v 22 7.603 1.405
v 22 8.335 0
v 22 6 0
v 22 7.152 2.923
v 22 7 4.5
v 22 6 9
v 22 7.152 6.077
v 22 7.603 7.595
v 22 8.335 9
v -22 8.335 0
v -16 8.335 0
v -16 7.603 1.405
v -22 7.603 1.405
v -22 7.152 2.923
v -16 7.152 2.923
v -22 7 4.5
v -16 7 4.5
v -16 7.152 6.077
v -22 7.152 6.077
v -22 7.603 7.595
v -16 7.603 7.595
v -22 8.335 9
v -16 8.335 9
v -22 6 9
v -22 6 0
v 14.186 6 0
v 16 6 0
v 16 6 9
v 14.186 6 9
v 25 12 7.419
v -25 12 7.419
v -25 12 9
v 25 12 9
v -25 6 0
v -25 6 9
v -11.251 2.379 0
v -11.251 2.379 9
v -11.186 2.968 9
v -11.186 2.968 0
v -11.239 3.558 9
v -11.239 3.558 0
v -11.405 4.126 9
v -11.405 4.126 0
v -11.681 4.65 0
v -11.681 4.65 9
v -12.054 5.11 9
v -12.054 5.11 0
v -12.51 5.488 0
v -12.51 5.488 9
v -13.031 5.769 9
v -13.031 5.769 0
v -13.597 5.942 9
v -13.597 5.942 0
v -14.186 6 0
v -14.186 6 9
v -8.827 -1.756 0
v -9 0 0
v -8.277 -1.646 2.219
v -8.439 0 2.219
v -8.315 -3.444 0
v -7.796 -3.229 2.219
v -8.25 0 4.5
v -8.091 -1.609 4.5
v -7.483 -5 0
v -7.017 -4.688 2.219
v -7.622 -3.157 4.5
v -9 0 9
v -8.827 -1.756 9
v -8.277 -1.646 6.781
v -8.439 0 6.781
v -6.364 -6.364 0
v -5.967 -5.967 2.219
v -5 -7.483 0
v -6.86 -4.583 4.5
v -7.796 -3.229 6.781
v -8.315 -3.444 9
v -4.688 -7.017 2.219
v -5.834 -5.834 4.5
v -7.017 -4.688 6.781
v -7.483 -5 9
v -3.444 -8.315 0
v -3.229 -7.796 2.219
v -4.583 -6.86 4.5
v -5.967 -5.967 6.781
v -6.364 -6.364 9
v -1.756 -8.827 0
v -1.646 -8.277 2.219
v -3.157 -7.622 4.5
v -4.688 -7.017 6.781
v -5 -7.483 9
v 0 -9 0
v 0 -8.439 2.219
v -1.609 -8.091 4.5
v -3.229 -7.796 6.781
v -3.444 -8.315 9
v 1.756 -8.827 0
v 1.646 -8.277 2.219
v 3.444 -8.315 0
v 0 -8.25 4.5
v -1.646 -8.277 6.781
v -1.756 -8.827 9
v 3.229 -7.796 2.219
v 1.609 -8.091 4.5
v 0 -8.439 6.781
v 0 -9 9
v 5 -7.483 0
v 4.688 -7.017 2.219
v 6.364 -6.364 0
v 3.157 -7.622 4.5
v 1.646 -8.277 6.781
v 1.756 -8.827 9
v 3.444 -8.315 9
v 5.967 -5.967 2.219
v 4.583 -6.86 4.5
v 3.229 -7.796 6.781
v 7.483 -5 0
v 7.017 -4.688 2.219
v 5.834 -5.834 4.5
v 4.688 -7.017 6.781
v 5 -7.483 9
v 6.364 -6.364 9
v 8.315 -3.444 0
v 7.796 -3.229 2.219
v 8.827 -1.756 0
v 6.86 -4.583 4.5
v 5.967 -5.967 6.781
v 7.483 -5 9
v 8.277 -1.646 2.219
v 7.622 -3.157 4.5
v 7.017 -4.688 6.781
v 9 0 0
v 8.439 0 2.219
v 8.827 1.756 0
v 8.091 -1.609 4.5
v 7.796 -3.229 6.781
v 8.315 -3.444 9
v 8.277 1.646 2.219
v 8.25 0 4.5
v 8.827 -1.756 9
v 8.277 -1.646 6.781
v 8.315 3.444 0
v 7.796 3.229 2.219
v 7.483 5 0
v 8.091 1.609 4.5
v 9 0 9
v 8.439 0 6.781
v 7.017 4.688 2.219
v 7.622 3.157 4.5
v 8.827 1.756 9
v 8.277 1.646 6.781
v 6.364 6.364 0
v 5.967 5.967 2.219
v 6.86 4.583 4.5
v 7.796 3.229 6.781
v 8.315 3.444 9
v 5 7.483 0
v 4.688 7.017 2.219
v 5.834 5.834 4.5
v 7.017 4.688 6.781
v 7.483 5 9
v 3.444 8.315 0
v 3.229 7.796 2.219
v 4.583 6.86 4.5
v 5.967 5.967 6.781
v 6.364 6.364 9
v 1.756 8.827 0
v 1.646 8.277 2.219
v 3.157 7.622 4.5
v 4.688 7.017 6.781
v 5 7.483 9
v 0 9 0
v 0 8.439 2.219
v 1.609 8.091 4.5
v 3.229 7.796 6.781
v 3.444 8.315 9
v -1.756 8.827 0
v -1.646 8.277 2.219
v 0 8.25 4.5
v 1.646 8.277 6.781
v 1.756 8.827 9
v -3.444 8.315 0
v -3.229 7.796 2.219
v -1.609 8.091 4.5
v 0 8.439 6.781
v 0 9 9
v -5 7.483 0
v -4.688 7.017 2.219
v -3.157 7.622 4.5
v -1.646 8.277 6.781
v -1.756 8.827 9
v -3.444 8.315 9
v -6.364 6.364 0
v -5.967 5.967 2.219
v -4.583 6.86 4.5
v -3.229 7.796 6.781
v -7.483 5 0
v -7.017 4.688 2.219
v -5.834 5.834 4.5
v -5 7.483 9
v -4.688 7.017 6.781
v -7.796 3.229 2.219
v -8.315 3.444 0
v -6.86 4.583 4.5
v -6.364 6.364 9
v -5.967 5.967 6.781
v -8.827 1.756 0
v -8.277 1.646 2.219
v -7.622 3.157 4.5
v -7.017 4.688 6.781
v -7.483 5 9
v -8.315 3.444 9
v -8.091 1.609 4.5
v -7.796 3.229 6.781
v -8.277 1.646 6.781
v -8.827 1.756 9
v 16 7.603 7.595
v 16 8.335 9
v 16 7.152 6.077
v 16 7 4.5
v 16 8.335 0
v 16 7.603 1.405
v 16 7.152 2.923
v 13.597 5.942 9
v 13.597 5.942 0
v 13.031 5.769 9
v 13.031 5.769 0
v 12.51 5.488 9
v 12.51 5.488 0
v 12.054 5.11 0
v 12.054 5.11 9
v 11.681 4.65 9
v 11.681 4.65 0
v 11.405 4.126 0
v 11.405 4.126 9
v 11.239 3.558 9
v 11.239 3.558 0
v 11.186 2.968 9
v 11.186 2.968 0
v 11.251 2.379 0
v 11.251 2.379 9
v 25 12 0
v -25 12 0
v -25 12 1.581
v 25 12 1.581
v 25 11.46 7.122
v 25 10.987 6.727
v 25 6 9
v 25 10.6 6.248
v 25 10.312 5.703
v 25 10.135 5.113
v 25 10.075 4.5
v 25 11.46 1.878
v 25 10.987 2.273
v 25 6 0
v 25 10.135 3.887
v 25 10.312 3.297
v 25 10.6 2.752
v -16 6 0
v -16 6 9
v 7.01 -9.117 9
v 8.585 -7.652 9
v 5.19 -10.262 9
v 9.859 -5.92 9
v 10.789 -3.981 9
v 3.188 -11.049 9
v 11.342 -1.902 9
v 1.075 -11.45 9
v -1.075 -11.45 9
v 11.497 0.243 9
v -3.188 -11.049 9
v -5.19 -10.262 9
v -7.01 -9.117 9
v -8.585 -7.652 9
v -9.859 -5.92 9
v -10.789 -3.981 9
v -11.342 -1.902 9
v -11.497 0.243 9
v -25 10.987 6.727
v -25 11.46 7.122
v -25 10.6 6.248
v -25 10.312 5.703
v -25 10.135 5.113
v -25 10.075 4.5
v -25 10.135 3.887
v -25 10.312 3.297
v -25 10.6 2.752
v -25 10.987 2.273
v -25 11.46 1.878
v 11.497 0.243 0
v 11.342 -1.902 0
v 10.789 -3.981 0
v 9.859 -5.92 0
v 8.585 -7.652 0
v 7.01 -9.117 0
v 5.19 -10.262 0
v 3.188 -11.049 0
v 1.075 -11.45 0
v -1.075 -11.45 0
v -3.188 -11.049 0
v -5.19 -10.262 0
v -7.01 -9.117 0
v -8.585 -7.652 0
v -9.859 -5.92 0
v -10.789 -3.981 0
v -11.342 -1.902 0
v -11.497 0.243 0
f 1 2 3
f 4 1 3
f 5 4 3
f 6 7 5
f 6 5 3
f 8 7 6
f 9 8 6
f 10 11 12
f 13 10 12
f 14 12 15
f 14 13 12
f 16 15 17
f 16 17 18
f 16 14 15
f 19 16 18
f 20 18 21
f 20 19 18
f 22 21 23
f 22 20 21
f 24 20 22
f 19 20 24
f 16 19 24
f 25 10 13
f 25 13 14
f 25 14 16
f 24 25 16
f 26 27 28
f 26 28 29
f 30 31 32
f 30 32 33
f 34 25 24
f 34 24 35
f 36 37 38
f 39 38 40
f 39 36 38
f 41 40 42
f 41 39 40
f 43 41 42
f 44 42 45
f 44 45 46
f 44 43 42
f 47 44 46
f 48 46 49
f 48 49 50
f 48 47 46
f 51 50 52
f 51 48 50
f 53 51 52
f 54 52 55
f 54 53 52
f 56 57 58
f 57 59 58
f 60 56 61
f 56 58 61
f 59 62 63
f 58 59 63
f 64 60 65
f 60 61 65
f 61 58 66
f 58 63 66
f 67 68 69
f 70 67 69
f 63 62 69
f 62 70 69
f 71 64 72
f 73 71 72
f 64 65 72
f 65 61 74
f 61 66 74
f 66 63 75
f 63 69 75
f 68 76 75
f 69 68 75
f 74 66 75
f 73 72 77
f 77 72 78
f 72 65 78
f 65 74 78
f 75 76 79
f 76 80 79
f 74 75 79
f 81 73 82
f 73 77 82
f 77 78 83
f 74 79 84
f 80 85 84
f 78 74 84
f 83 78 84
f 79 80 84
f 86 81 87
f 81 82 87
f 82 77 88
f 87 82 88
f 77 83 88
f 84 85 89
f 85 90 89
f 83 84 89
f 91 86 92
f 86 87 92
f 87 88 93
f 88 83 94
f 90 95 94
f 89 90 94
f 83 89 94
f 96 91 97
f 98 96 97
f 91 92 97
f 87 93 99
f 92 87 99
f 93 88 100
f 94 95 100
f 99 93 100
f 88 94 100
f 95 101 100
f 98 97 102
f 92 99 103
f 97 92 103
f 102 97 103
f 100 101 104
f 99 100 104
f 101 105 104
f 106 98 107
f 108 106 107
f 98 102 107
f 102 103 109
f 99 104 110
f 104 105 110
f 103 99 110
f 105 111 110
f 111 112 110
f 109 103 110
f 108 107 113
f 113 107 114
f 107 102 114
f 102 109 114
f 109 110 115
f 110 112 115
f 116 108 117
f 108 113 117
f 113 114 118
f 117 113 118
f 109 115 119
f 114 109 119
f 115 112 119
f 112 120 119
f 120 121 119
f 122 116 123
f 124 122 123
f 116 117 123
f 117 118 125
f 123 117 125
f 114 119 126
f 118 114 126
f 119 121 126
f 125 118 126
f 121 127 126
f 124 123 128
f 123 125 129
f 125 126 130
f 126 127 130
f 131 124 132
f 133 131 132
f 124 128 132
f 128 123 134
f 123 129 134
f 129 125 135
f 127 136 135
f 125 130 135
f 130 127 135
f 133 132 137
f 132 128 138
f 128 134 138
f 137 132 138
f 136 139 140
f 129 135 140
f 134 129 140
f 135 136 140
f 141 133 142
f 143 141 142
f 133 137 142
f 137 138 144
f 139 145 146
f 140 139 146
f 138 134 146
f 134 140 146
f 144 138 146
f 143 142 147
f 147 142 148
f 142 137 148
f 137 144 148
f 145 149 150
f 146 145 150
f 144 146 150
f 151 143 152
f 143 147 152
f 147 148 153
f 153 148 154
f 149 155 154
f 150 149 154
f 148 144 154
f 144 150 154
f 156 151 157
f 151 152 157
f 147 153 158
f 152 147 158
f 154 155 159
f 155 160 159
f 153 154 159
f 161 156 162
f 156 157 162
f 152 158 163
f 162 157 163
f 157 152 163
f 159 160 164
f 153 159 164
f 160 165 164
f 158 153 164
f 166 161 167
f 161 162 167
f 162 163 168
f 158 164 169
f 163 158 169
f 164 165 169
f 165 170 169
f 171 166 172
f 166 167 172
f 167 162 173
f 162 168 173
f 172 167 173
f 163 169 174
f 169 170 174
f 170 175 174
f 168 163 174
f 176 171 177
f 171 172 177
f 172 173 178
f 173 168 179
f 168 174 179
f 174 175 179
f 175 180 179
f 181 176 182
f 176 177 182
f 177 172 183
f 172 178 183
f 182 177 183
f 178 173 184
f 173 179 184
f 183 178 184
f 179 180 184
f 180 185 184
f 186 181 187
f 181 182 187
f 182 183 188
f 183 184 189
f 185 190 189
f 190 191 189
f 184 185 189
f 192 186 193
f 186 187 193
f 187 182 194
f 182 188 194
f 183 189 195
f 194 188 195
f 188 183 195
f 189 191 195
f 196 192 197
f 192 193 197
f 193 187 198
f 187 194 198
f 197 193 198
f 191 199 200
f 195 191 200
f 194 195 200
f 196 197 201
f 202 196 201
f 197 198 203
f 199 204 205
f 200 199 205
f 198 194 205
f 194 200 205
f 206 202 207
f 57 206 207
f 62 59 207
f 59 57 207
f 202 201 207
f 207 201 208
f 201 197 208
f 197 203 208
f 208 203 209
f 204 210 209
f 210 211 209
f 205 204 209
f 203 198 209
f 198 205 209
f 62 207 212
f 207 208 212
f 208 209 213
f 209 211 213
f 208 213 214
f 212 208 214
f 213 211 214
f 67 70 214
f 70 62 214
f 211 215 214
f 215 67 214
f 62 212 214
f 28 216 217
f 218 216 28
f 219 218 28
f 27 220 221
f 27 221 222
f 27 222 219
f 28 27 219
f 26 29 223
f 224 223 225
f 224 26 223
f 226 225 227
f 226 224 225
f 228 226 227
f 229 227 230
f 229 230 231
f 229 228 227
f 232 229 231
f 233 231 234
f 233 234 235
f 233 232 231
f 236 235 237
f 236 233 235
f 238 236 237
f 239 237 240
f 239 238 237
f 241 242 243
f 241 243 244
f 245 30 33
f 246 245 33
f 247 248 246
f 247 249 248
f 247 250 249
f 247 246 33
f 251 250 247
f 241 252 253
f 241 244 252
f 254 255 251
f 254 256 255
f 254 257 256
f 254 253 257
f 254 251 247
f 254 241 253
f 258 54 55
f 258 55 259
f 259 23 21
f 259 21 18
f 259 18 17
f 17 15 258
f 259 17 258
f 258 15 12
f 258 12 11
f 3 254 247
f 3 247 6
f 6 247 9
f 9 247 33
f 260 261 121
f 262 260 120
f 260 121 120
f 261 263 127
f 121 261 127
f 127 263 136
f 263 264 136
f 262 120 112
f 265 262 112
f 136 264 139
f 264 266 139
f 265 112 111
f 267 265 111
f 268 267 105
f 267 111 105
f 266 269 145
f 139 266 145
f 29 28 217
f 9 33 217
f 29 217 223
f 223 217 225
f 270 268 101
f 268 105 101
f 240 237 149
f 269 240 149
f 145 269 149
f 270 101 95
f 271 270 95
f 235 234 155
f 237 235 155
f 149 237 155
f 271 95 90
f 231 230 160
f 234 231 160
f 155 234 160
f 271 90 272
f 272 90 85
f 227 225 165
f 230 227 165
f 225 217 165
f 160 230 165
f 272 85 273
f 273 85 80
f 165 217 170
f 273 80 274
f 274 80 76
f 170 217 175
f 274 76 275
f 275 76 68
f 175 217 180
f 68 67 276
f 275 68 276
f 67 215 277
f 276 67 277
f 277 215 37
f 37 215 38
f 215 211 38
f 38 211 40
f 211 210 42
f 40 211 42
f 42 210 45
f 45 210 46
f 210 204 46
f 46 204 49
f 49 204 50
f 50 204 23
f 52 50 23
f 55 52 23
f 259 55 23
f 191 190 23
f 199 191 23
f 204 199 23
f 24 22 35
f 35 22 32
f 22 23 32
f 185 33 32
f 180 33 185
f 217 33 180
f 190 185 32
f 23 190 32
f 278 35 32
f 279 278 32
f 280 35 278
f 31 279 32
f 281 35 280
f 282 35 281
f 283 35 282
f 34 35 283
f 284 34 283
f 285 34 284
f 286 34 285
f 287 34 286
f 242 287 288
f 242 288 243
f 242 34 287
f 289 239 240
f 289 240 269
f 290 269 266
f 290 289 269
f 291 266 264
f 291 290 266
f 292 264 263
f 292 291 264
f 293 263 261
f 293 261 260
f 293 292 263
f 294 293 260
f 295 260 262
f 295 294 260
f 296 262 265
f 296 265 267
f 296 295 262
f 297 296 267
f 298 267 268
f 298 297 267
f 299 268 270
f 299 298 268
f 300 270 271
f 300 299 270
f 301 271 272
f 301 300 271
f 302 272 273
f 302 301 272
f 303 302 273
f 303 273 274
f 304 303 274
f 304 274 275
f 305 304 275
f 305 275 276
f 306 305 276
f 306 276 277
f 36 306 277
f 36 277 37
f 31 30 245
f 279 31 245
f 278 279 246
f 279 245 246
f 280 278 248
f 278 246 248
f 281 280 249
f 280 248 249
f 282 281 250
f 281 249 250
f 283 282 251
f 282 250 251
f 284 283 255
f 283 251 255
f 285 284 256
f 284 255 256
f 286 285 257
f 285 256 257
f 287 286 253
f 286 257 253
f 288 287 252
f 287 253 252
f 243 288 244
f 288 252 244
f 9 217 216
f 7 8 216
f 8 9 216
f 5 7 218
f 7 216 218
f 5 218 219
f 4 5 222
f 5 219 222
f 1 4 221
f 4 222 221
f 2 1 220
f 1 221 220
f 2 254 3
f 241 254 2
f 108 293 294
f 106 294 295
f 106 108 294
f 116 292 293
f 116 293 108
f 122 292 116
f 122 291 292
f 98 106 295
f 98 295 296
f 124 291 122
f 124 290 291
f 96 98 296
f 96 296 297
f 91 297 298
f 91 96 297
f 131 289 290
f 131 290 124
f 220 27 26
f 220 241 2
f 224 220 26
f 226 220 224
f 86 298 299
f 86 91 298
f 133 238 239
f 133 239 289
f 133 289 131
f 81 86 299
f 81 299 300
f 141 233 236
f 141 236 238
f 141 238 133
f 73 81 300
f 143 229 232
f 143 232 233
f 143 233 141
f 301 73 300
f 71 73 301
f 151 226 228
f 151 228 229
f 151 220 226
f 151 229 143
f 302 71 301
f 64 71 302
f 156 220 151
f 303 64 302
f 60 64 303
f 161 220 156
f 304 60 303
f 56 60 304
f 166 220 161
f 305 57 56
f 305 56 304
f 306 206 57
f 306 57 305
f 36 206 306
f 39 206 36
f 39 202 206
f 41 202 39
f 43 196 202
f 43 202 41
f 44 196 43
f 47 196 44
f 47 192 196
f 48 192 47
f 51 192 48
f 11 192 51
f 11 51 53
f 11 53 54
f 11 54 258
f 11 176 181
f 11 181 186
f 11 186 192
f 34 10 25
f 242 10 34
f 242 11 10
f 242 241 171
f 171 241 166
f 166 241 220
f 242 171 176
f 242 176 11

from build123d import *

# Parameters (mm, degrees)
SKETCH2_R           = 8.25
BOSS_EXTRUDE1_DEPTH = 9
SKETCH3_R           = 3.175
CUT_EXTRUDE1_DEPTH  = 51
SKETCH4_OUTSIDE_W   = 22.196
SKETCH4_OUTSIDE_H   = 36.696
SKETCH4_OUTSIDE_R   = 8.25
CUT_EXTRUDE2_DEPTH  = 6
CUT_EXTRUDE3_DEPTH  = 6


with BuildPart() as part:
    # Sketch2 → Boss-Extrude1 (new body)
    with BuildSketch(Plane.XY):
        with BuildLine():
            Line((-25, 12), (25, 12))
            Line((25, 12), (25, 6))
            Line((25, 6), (22, 6))
            Line((22, 6), (22, 7))
            Line((22, 7), (16, 7))
            Line((16, 7), (16, 6))
            Line((16, 6), (14.186260959, 6))
            ThreePointArc((14.186260959, 6), (11.855802961, 4.88917059), (11.251172485, 2.379310345))
            ThreePointArc((11.251172485, 2.379310345), (0, -11.5), (-11.251172485, 2.379310345))
            ThreePointArc((-11.251172485, 2.379310345), (-11.855802961, 4.88917059), (-14.186260959, 6))
            Line((-14.186260959, 6), (-16, 6))
            Line((-16, 6), (-16, 7))
            Line((-16, 7), (-22, 7))
            Line((-22, 7), (-22, 6))
            Line((-22, 6), (-25, 6))
            Line((-25, 6), (-25, 12))
        make_face()
        Circle(SKETCH2_R, mode=Mode.SUBTRACT)
    extrude(amount=BOSS_EXTRUDE1_DEPTH)

    # Sketch3 → Cut-Extrude1 (cut, through all)
    with BuildSketch(Plane(origin=(25, 0, 0), x_dir=(0, 0, -1), z_dir=(1, 0, 0))):
        with Locations((-4.5, 13.25)):
            Circle(SKETCH3_R)
    extrude(amount=-CUT_EXTRUDE1_DEPTH, mode=Mode.SUBTRACT)

    # Sketch4 outside → Cut-Extrude2 (cut)
    with BuildSketch(Plane(origin=(-22, 0, 0), x_dir=(0, 0, -1), z_dir=(1, 0, 0))):
        with Locations((-4.5, 0.25)):
            Rectangle(SKETCH4_OUTSIDE_W, SKETCH4_OUTSIDE_H)
        with Locations((-4.5, 15.25)):
            Circle(SKETCH4_OUTSIDE_R, mode=Mode.SUBTRACT)
    extrude(amount=CUT_EXTRUDE2_DEPTH, mode=Mode.SUBTRACT)

    # Sketch5 → Cut-Extrude3 (cut)
    with BuildSketch(Plane.ZY.offset(-16)):
        with BuildLine():
            Line((0, 8.335341657), (0, 6))
            Line((0, 6), (9, 6))
            Line((9, 6), (9, 8.335341657))
            ThreePointArc((9, 8.335341657), (4.5, 7), (0, 8.335341657))
        make_face()
    extrude(amount=-CUT_EXTRUDE3_DEPTH, mode=Mode.SUBTRACT)

    # Sketch6 → Cut-Revolve1 (revolve, cut)
    with BuildSketch(Plane(origin=(0, 0, 0), x_dir=(0, 0, -1), z_dir=(1, 0, 0)), mode=Mode.PRIVATE) as cut_revolve1_sk:
        with BuildLine():
            Line((-9, 9), (-9, 0))
            Line((-9, 0), (0, 0))
            Line((0, 0), (0, 9))
            ThreePointArc((0, 9), (-4.5, 8.25), (-9, 9))
        make_face()
    revolve(cut_revolve1_sk.sketch.rotate(Axis((0, 0, 9), (0, 0, 1)), 90), axis=Axis((0, 0, 9), (0, 0, 1)), mode=Mode.SUBTRACT)  # turned: the seam where the file's is


solid = part.part
